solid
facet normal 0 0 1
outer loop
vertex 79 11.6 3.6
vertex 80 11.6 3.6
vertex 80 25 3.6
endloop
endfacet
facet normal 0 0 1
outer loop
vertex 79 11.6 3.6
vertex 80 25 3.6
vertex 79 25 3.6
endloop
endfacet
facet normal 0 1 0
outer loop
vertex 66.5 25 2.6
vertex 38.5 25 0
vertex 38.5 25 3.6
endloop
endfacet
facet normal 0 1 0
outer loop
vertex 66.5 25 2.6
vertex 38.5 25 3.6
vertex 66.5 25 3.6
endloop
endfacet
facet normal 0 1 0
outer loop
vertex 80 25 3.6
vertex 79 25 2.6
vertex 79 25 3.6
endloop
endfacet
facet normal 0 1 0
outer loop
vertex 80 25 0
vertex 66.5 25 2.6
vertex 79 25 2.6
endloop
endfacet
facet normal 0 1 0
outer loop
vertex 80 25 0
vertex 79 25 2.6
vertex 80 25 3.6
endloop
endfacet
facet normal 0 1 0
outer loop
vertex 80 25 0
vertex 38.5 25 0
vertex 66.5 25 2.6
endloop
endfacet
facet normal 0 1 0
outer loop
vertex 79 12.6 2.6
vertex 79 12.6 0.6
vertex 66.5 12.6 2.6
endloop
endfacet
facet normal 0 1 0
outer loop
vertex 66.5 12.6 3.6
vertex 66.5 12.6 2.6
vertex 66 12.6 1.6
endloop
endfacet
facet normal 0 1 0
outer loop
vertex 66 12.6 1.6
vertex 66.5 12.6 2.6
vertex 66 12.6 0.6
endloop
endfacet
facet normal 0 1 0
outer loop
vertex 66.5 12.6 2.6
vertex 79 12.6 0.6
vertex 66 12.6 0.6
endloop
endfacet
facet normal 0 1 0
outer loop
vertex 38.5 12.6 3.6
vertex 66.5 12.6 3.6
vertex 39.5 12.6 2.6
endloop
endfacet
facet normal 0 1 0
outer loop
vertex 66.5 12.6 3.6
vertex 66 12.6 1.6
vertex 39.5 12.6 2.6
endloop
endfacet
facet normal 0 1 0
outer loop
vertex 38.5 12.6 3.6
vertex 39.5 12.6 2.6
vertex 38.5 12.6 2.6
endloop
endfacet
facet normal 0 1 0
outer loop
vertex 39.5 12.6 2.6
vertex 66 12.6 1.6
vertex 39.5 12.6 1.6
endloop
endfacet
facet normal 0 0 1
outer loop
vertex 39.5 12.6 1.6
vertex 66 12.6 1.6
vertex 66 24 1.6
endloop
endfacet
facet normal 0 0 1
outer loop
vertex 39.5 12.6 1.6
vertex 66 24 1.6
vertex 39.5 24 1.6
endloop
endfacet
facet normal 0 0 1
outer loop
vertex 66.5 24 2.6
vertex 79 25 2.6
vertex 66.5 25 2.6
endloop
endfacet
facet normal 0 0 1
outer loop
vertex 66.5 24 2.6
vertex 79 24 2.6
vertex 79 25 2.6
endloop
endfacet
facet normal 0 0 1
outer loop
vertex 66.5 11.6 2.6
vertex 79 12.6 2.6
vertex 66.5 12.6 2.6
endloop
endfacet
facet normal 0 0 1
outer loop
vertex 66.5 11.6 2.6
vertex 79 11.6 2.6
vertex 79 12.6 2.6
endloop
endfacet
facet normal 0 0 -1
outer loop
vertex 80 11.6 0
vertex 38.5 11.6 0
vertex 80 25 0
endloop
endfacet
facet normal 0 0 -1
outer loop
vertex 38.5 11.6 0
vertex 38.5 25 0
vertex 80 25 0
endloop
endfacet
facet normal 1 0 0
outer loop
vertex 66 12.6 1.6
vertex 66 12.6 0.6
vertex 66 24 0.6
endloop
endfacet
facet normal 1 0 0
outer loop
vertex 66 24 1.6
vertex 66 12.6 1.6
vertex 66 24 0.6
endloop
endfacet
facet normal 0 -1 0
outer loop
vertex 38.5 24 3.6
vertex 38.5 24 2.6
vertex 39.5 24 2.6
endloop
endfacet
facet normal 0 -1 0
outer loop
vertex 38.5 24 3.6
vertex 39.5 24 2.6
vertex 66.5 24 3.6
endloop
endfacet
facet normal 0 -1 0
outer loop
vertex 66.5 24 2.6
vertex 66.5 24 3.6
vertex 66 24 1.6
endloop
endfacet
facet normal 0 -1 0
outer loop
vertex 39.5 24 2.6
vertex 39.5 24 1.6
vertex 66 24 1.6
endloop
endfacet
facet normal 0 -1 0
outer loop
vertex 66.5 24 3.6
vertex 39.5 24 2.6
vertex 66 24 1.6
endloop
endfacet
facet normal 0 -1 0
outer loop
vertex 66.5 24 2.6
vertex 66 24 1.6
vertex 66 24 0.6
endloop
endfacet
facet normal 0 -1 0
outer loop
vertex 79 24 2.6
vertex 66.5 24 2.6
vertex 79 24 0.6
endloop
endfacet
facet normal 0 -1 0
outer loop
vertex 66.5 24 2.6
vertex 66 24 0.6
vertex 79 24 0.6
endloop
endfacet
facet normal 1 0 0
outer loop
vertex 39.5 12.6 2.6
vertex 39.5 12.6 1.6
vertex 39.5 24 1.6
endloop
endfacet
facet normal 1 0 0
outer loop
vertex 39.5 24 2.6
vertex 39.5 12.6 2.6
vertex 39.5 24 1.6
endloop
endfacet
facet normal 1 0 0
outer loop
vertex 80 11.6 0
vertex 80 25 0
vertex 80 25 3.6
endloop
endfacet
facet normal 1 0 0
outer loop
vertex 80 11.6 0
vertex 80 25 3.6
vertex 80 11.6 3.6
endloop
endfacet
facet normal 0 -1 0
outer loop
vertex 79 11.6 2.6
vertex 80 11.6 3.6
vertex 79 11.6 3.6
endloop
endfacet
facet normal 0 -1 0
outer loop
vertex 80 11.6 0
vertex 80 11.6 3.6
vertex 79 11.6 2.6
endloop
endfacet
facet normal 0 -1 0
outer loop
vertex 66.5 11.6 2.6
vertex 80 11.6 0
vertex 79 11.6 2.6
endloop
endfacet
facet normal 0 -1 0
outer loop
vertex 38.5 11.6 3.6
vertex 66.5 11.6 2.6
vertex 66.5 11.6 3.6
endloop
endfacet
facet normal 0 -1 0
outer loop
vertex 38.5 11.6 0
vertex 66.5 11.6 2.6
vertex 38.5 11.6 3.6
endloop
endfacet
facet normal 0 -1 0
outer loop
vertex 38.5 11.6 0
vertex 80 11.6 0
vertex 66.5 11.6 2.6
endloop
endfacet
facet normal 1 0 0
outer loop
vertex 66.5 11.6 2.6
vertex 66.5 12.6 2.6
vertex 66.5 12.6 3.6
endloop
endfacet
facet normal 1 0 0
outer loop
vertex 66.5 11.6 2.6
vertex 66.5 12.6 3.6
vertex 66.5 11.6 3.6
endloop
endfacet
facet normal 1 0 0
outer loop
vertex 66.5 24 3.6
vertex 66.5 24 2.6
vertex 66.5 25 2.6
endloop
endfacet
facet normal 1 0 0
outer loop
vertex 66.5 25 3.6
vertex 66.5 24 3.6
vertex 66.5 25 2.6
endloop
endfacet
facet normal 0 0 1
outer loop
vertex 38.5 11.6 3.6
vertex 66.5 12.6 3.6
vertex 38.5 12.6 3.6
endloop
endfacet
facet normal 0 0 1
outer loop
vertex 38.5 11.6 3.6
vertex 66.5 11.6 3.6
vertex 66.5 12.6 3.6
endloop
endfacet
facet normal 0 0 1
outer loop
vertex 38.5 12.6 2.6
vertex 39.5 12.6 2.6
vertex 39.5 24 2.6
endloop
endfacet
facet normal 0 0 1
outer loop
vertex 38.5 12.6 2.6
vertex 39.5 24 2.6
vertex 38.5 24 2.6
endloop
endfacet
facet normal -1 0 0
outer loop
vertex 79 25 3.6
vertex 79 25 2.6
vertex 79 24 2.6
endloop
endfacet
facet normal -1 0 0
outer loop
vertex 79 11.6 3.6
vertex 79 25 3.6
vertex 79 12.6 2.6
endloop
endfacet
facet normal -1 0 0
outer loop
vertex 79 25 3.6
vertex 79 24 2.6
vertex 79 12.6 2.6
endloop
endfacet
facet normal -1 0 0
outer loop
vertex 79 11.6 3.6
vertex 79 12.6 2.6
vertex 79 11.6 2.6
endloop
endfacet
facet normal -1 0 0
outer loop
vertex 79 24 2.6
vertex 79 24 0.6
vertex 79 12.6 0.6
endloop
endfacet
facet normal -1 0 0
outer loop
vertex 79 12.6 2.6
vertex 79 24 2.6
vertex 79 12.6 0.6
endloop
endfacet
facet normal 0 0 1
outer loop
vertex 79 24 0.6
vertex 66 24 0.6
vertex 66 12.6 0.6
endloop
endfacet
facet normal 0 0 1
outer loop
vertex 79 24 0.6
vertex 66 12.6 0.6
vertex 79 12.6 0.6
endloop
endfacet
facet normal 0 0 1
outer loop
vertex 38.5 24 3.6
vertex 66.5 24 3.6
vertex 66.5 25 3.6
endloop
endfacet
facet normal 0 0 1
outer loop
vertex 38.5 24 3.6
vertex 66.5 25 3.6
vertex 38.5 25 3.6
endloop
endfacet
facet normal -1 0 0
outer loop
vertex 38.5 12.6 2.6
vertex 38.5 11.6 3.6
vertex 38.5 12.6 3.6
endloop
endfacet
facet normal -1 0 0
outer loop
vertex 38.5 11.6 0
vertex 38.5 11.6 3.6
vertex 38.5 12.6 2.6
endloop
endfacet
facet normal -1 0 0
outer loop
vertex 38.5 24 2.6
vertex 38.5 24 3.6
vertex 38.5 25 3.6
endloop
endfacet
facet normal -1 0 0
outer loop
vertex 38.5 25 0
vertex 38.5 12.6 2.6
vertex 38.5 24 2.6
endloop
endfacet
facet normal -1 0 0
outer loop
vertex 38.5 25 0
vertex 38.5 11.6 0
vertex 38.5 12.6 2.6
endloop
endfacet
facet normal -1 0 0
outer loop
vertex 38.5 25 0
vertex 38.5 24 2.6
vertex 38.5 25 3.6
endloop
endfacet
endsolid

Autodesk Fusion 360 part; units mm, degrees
sketch "Sketch1" plane through (0, 0, 0) normal (0, 0, 1) x (1, 0, 0)
  line L0 (38.5, 25) -> (80, 25)
  line L1 (80, 25) -> (80, 11.6)
  line L2 (80, 11.6) -> (38.5, 11.6)
  line L3 (38.5, 11.6) -> (38.5, 25)
  dimension "d1" = 41.5
  dimension "d2" = 13.4
extrude "Extrude1" add sketch "Sketch1" along normal blind 0.6
sketch "Sketch2" plane through (0, 0, 0.6) normal (0, 0, 1) x (-1, 0, 0)
  line L0 (-38.5, -11.6) -> (-80, -11.6)
  line L1 (-80, -11.6) -> (-80, -25)
  line L2 (-80, -25) -> (-38.5, -25)
  line L3 (-38.5, -25) -> (-38.5, -11.6)
  line L4 (-39.5, -24) -> (-79, -24)
  line L5 (-79, -12.6) -> (-39.5, -12.6)
  line L6 (-39.5, -12.6) -> (-39.5, -24)
  line L7 (-80, -18.3) -> (-38.5, -18.3) construction
  line L8 (-66.5, -24) -> (-66.5, -25)
  line L9 (-79, -24) -> (-79, -12.6)
  line L10 (-59.25, -25) -> (-59.25, -11.6) construction
  line L11 (-66.5, -12.6) -> (-66.5, -11.6)
  line L12 (-39.5, -24) -> (-38.5, -24)
  line L13 (-39.5, -12.6) -> (-38.5, -12.6)
  line L14 (-79, -12.6) -> (-79, -11.6)
  line L15 (-79, -24) -> (-79, -25)
  dimension "d5" = 1
  dimension "d6" = 1
  dimension "d12" = 27
extrude "Extrude14" add sketch "Sketch2" along normal blind 3 contours L0 L3 L5 L11 L13 | L0 L1 L2 L9 L14 L15 | L2 L3 L4 L8 L12
extrude "Extrude9" add sketch "Sketch2" along normal blind 2 contours L0 L5 L11 L14 | L3 L6 L12 L13 | L2 L4 L8 L15
sketch "Sketch7" plane through (0, 0, 0.6) normal (0, 0, 1) x (-1, 0, 0)
  line L0 (-39.5, -12.6) -> (-79, -12.6)
  line L1 (-79, -12.6) -> (-79, -24)
  line L2 (-79, -24) -> (-39.5, -24)
  line L3 (-66, -24) -> (-39.5, -24)
  line L4 (-39.5, -24) -> (-39.5, -12.6)
  line L5 (-39.5, -12.6) -> (-66, -12.6)
  line L6 (-66, -12.6) -> (-66, -24)
  line L7 (-39.5, -24) -> (-39.5, -12.6)
extrude "Extrude17" add sketch "Sketch7" along normal blind 1 contours L0 L2 L3 L4 L5 L6 L7
